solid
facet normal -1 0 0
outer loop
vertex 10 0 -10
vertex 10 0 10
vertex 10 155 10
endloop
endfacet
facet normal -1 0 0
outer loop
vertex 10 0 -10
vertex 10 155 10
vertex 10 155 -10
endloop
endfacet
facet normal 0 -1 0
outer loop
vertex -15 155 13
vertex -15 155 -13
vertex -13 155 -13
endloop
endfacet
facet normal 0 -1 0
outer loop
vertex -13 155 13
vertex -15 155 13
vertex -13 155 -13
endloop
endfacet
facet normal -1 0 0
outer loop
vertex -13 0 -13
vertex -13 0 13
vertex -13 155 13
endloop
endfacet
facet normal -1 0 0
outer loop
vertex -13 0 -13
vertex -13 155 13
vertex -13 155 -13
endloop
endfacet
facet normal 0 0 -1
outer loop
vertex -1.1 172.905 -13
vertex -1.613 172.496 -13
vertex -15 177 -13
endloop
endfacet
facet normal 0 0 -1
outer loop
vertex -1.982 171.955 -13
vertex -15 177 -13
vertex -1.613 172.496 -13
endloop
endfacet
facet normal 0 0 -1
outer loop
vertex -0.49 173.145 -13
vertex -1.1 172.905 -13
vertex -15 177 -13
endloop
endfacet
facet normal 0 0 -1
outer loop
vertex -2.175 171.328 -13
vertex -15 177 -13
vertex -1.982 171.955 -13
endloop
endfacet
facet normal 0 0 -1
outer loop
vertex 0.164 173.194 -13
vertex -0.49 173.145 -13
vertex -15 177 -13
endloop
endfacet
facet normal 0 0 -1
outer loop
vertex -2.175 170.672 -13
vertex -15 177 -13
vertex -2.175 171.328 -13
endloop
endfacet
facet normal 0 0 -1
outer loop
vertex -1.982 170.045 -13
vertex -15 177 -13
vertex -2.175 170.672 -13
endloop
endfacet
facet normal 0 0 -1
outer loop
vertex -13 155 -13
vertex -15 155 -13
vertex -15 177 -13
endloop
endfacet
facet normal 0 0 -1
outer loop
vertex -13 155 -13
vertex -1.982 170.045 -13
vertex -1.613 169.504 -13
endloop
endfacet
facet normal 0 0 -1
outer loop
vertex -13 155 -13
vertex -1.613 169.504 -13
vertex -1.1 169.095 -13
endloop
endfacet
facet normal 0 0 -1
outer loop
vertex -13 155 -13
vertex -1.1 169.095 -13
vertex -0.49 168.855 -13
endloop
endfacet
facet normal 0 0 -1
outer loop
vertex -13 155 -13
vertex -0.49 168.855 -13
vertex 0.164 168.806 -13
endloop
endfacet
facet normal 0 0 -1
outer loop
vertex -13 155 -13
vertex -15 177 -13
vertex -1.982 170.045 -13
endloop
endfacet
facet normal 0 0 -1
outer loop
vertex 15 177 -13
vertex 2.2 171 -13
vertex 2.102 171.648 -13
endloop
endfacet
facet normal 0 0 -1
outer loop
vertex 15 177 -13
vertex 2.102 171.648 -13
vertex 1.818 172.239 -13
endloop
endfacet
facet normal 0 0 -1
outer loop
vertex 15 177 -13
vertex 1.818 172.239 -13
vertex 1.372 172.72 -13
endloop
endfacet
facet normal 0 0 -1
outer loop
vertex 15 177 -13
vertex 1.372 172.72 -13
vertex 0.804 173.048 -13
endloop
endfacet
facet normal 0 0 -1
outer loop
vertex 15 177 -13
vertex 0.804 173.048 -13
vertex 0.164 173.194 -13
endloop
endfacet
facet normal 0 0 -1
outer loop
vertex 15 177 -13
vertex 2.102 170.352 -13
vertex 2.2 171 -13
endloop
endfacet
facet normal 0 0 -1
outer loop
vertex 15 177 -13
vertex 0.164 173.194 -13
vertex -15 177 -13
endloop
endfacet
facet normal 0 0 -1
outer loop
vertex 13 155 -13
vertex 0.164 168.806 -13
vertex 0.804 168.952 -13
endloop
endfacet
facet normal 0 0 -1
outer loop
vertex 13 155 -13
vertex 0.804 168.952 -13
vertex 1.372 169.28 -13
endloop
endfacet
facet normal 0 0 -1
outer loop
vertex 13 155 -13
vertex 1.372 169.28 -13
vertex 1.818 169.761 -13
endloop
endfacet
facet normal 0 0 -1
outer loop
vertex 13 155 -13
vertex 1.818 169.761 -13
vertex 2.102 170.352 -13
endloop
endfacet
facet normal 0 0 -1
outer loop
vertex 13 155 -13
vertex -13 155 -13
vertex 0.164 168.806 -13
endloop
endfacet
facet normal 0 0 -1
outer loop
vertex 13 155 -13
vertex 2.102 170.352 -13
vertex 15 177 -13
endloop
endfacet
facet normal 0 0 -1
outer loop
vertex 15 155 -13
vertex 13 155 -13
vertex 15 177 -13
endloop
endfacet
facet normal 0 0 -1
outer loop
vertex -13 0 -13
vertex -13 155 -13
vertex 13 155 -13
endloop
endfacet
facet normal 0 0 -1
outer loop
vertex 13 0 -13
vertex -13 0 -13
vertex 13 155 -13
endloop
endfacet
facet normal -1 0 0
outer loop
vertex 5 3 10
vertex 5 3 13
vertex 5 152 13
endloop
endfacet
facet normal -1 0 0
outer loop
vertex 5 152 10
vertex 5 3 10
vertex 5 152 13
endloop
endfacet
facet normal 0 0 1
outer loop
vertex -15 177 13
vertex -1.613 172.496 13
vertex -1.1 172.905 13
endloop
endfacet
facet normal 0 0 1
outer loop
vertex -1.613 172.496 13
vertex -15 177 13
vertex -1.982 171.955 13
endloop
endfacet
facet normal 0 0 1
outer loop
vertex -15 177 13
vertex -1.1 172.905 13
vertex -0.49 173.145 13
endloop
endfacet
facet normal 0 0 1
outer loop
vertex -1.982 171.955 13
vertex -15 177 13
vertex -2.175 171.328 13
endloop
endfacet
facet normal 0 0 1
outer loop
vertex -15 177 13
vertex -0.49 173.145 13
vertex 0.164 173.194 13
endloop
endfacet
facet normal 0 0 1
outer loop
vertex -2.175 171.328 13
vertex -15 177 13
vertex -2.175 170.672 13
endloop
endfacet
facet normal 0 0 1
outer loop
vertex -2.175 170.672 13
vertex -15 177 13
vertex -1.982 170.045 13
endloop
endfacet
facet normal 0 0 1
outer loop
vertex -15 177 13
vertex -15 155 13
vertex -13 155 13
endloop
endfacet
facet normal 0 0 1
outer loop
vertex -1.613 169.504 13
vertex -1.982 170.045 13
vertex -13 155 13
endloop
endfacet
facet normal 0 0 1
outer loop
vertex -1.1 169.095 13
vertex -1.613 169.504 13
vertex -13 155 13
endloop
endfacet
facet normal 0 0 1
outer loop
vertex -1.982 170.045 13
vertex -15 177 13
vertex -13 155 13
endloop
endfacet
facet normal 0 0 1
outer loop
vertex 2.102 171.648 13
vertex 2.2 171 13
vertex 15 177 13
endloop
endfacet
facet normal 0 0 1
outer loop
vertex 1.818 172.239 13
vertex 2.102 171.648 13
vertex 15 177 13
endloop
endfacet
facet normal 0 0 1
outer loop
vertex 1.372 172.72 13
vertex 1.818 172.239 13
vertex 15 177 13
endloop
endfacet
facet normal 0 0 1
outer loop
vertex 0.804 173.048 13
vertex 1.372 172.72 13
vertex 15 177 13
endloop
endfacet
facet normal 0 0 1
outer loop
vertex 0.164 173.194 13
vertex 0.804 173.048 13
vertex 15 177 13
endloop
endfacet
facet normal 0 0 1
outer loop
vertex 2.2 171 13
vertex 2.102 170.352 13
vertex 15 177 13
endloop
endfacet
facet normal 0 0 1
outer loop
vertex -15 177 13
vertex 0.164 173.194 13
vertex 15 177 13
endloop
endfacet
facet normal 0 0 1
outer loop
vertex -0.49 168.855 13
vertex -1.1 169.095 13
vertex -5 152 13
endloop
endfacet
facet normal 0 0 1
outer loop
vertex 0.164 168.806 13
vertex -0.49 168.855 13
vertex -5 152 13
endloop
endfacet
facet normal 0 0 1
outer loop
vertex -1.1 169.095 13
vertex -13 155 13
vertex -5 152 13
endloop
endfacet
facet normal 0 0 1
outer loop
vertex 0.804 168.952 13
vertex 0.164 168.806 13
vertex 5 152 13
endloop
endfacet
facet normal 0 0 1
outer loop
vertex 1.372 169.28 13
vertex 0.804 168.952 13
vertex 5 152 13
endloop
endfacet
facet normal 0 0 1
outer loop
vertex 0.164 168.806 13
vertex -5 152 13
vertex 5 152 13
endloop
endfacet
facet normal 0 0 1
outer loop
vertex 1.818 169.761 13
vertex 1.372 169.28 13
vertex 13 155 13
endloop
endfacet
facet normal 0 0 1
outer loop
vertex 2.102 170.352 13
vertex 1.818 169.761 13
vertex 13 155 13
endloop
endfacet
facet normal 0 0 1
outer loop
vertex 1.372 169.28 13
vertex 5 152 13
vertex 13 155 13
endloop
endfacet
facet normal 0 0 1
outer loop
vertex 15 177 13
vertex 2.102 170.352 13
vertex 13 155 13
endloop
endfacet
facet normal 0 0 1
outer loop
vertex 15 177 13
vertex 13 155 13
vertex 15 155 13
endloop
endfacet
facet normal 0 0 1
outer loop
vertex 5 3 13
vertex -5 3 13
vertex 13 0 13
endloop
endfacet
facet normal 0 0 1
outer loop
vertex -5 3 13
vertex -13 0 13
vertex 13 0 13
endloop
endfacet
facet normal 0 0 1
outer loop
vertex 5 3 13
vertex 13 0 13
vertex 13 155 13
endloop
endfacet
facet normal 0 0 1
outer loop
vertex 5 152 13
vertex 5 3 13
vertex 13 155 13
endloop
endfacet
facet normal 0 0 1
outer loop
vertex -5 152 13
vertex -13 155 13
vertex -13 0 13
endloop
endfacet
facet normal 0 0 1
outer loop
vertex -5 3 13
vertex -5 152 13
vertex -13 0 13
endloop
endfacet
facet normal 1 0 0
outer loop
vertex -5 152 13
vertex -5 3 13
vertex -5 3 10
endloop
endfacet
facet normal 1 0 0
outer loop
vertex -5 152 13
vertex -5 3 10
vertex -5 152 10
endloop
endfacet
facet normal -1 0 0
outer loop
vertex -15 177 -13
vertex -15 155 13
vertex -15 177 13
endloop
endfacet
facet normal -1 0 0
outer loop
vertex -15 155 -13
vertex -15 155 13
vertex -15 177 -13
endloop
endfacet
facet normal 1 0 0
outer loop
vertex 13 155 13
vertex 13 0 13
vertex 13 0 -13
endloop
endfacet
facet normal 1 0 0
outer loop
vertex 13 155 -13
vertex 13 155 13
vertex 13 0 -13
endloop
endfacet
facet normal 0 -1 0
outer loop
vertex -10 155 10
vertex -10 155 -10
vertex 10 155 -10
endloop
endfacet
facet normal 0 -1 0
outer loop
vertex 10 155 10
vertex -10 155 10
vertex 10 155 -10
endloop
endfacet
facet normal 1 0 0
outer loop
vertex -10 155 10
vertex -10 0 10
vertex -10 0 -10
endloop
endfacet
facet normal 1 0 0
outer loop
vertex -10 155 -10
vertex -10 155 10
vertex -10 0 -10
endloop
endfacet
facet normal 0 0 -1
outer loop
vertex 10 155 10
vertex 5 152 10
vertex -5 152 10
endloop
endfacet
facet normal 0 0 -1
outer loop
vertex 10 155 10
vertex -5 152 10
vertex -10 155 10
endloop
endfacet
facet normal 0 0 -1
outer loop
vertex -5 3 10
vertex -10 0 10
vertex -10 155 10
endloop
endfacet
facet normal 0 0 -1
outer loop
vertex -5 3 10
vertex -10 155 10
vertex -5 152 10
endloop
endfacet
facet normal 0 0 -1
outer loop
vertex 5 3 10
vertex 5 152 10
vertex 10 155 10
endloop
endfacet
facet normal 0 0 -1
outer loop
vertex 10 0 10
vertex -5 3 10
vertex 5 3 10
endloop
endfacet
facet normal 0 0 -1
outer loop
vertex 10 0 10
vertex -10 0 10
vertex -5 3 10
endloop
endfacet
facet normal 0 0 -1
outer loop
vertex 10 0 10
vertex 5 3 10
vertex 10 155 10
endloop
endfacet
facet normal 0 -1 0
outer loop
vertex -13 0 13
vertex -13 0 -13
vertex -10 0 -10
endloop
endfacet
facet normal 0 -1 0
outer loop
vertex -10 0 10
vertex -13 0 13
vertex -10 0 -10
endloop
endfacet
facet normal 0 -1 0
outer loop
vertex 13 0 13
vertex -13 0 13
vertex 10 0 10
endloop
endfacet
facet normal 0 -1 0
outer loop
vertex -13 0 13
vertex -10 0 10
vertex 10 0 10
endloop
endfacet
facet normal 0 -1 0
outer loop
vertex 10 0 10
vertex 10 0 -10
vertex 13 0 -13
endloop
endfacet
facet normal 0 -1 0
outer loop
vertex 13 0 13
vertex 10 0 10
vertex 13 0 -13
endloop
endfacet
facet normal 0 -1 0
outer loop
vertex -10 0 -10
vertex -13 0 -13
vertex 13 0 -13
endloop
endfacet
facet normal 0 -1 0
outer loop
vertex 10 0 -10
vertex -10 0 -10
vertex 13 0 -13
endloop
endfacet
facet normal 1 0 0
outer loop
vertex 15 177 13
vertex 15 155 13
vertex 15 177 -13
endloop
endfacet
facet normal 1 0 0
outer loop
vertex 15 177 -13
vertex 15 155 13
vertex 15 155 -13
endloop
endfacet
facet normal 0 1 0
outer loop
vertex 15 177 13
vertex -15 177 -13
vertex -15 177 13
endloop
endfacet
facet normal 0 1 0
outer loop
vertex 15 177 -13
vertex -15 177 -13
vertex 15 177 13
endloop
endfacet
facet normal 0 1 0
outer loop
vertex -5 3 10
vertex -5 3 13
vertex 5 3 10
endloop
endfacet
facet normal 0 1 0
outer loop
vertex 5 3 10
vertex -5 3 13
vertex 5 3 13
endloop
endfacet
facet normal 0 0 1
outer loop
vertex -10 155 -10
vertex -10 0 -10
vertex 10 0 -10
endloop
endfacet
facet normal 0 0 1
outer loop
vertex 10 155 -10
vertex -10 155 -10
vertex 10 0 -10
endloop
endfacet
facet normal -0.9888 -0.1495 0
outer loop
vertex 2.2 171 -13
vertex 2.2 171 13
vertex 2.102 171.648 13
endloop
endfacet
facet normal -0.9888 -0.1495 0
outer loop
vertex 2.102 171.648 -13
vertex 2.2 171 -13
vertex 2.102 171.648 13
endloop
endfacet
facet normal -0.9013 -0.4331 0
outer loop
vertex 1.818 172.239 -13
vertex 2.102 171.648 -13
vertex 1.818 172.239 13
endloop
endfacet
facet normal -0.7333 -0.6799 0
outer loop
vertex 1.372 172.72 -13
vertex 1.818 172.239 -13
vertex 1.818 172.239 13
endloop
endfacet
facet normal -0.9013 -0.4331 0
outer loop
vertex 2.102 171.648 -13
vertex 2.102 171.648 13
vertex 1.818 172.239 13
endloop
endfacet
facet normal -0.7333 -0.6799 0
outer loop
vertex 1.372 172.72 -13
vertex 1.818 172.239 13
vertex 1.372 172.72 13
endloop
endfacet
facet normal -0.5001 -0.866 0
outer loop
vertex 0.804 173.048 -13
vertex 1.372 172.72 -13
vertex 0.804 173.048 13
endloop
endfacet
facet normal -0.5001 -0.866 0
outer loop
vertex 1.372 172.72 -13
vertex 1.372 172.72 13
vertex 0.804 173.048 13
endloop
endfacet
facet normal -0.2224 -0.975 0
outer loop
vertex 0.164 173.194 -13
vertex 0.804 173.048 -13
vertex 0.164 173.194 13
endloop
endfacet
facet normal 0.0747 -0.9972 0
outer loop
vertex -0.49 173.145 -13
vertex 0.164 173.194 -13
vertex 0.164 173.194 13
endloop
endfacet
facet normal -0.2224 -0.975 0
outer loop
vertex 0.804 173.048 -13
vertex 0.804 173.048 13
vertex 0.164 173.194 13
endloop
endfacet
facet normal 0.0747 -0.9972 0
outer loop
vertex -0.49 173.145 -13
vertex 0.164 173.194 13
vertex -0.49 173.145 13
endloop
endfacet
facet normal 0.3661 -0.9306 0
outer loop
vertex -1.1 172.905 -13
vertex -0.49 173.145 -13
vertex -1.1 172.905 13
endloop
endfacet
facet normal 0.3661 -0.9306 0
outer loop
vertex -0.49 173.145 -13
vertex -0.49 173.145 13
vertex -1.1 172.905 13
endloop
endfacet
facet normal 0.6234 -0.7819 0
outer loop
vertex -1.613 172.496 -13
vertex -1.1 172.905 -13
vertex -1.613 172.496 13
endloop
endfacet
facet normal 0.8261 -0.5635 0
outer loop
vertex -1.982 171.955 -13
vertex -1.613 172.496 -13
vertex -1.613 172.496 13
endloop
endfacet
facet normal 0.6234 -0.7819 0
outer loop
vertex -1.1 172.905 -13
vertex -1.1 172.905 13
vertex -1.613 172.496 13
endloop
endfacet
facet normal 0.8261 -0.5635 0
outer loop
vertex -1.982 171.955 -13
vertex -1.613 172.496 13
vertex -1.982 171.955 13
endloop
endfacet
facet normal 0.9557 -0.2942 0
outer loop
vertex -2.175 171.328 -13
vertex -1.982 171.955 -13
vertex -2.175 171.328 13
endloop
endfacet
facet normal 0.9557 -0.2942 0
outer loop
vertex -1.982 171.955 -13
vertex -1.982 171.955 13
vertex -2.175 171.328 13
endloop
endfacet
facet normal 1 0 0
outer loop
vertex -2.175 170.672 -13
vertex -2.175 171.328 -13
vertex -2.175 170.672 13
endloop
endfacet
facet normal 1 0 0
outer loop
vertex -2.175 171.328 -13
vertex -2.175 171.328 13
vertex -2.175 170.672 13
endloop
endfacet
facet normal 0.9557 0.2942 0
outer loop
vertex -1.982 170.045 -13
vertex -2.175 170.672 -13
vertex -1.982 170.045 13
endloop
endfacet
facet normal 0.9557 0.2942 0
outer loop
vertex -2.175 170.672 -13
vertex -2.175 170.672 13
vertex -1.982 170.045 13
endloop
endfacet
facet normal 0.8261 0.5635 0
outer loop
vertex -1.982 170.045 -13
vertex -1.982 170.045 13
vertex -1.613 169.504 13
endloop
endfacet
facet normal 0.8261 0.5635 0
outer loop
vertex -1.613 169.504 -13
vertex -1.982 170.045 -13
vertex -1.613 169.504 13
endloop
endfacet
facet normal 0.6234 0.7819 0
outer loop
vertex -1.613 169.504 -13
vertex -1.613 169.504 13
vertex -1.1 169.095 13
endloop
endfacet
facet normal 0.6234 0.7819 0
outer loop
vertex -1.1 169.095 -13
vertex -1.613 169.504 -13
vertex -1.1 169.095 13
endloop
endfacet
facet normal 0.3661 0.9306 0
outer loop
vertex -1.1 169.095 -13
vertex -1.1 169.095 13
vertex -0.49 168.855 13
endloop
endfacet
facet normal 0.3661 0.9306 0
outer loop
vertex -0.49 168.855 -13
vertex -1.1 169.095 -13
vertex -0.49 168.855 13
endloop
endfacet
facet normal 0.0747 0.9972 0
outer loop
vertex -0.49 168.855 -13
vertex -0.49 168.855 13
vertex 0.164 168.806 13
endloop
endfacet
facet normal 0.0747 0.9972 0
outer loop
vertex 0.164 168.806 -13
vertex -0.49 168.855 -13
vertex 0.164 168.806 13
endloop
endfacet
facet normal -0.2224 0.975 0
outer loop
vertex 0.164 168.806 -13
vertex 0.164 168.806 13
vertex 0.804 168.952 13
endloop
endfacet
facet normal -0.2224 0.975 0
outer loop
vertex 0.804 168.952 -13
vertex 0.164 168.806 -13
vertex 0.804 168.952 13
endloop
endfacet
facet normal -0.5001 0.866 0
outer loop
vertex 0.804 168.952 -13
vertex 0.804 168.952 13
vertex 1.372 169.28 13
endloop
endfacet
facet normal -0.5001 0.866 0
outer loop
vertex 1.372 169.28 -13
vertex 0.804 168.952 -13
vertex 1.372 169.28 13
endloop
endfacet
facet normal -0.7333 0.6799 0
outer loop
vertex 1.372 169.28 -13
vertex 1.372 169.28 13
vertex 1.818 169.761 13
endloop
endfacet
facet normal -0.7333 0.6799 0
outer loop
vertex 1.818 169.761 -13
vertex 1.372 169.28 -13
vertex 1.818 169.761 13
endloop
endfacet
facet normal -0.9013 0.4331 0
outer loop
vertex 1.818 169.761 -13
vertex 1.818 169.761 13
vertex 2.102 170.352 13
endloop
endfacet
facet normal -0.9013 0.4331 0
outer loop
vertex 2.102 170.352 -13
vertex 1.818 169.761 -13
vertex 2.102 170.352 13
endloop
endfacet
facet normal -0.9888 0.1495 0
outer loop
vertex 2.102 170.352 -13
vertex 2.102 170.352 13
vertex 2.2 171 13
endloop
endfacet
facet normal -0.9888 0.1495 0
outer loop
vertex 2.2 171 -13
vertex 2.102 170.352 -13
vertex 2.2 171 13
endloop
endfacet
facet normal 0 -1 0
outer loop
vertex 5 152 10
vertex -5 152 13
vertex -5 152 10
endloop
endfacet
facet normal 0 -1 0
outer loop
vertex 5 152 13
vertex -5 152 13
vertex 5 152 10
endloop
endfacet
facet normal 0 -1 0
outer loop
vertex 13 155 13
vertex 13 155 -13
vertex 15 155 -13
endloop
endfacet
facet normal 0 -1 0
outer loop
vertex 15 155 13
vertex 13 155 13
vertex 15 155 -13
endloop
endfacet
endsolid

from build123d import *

# Parameters (mm, degrees)
SKETCH1_W           = 26
SKETCH1_H           = 26
BOSS_EXTRUDE1_DEPTH = 155
SHELL1_T            = -3
SKETCH2_W           = 10
SKETCH2_H           = 149
CUT_EXTRUDE1_DEPTH  = 3
SKETCH3_W           = 30
SKETCH3_H           = 26
BOSS_EXTRUDE2_DEPTH = 22
SKETCH4_R           = 2.2
CUT_EXTRUDE2_DEPTH  = 180.52715672


with BuildPart() as part:
    # Sketch1 → Boss-Extrude1 (new body)
    with BuildSketch(Plane(origin=(0, 0, 0), x_dir=(1, 0, 0), z_dir=(0, 1, 0))):
        Rectangle(SKETCH1_W, SKETCH1_H)
    extrude(amount=BOSS_EXTRUDE1_DEPTH)

    # Shell1
    shell1_openings = [part.faces().sort_by_distance(p)[0] for p in [
        (0, 155, 0),
        (0, 0, 0),
    ]]
    offset(amount=SHELL1_T, openings=shell1_openings, kind=Kind.INTERSECTION)

    # Sketch2 → Cut-Extrude1 (cut)
    with BuildSketch(Plane.XY.offset(13)):
        with Locations((0, 77.5)):
            Rectangle(SKETCH2_W, SKETCH2_H)
    extrude(amount=-CUT_EXTRUDE1_DEPTH, mode=Mode.SUBTRACT)

    # Sketch3 → Boss-Extrude2 (add)
    with BuildSketch(Plane(origin=(0, 155, 0), x_dir=(1, 0, 0), z_dir=(0, 1, 0))):
        Rectangle(SKETCH3_W, SKETCH3_H)
    extrude(amount=BOSS_EXTRUDE2_DEPTH)

    # Sketch4 → Cut-Extrude2 (cut, through all)
    with BuildSketch(Plane.XY.offset(13)):
        with Locations((0, 171)):
            Circle(SKETCH4_R)
    extrude(amount=-CUT_EXTRUDE2_DEPTH, mode=Mode.SUBTRACT)


solid = part.part
